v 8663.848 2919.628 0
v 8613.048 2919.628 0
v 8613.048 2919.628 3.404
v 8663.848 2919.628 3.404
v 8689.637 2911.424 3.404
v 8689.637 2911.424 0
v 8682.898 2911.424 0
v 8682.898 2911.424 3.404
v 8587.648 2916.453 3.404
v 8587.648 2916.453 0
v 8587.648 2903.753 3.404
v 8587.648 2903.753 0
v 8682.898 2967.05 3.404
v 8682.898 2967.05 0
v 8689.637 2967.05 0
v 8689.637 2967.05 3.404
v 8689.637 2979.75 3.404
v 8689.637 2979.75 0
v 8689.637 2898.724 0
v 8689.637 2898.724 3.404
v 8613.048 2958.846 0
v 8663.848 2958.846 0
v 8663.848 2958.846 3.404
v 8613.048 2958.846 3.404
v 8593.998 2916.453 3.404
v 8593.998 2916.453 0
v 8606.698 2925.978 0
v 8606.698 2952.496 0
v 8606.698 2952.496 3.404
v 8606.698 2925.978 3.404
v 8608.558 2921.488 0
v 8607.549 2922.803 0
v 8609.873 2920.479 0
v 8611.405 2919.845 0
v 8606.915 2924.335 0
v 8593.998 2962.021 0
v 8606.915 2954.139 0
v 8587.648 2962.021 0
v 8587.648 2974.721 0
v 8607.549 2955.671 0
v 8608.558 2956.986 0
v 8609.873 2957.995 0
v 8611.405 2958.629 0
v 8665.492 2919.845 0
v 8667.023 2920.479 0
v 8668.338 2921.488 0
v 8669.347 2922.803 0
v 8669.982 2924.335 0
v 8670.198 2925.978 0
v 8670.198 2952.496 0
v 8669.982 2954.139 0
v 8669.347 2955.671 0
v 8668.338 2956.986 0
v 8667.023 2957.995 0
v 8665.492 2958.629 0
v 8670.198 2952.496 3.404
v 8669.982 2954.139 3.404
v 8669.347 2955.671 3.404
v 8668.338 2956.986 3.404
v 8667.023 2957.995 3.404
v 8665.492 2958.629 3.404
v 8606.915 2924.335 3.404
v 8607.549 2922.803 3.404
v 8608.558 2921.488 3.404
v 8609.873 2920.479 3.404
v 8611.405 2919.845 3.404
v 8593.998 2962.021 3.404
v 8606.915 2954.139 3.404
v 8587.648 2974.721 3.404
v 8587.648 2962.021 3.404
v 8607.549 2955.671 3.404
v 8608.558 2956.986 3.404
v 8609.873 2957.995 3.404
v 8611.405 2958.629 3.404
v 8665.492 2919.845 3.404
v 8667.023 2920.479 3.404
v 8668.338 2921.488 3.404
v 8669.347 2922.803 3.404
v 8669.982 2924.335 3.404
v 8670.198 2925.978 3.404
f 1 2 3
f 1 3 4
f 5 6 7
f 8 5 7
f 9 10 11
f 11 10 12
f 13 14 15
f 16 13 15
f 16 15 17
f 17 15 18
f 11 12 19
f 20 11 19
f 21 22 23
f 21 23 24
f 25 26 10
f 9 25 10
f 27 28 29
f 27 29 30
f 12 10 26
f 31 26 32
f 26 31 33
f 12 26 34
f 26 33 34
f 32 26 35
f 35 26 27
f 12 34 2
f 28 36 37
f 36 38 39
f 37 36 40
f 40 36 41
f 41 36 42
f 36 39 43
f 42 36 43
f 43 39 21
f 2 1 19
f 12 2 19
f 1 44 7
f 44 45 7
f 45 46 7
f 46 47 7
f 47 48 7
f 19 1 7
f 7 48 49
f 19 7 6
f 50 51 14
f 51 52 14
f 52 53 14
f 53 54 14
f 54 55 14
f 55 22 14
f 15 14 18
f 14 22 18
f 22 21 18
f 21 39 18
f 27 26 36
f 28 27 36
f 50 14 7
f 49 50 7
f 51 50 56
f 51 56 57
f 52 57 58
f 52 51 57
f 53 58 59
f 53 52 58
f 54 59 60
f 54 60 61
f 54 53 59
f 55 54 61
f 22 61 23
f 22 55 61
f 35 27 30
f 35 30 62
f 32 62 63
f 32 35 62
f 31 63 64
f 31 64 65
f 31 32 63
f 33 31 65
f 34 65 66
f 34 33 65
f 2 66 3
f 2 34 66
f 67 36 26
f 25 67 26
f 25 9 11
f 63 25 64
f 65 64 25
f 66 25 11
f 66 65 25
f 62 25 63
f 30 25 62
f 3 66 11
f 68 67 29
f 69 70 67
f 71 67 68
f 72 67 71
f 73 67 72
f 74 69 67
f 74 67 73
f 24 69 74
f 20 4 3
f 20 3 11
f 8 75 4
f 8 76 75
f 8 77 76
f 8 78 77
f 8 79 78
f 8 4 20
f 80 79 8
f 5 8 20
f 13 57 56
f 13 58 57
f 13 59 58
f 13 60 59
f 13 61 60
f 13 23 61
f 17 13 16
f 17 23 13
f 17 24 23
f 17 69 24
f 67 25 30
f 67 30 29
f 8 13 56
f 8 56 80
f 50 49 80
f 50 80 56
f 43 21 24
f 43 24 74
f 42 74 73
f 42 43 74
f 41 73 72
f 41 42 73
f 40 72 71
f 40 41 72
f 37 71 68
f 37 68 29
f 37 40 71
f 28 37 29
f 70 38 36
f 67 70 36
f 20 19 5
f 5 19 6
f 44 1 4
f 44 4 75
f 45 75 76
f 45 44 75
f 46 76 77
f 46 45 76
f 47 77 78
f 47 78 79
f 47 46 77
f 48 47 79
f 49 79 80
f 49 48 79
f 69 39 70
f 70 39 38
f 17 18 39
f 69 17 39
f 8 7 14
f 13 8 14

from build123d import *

# Parameters (mm, degrees)
BOSS_EXTRUDE1_DEPTH = 3.4036


with BuildPart() as part:
    # Sketch1 → Boss-Extrude1 (new body)
    with BuildSketch(Plane.XY):
        Polygon((8689.636759917, 2979.750055989), (8587.64819291, 2974.720855989), (8587.64819291, 2962.020855989), (8593.99819291, 2962.020855989), (8593.99819291, 2916.453255989), (8587.64819291, 2916.453255989), (8587.64819291, 2903.753255989), (8689.636759917, 2898.724055989), (8689.636759917, 2911.424055989), (8682.89819291, 2911.424055989), (8682.89819291, 2967.050055989), (8689.636759917, 2967.050055989), align=None)
        with BuildLine():
            Line((8606.69819291, 2952.495855989), (8606.69819291, 2925.978255989))
            ThreePointArc((8606.69819291, 2925.978255989), (8608.55806485, 2921.488127929), (8613.04819291, 2919.628255989))
            Line((8613.04819291, 2919.628255989), (8663.84819291, 2919.628255989))
            ThreePointArc((8663.84819291, 2919.628255989), (8668.338320971, 2921.488127929), (8670.19819291, 2925.978255989))
            Line((8670.19819291, 2925.978255989), (8670.19819291, 2952.495855989))
            ThreePointArc((8670.19819291, 2952.495855989), (8668.338320971, 2956.98598405), (8663.84819291, 2958.845855989))
            Line((8663.84819291, 2958.845855989), (8613.04819291, 2958.845855989))
            ThreePointArc((8613.04819291, 2958.845855989), (8608.55806485, 2956.98598405), (8606.69819291, 2952.495855989))
        make_face(mode=Mode.SUBTRACT)
    extrude(amount=BOSS_EXTRUDE1_DEPTH)


solid = part.part
